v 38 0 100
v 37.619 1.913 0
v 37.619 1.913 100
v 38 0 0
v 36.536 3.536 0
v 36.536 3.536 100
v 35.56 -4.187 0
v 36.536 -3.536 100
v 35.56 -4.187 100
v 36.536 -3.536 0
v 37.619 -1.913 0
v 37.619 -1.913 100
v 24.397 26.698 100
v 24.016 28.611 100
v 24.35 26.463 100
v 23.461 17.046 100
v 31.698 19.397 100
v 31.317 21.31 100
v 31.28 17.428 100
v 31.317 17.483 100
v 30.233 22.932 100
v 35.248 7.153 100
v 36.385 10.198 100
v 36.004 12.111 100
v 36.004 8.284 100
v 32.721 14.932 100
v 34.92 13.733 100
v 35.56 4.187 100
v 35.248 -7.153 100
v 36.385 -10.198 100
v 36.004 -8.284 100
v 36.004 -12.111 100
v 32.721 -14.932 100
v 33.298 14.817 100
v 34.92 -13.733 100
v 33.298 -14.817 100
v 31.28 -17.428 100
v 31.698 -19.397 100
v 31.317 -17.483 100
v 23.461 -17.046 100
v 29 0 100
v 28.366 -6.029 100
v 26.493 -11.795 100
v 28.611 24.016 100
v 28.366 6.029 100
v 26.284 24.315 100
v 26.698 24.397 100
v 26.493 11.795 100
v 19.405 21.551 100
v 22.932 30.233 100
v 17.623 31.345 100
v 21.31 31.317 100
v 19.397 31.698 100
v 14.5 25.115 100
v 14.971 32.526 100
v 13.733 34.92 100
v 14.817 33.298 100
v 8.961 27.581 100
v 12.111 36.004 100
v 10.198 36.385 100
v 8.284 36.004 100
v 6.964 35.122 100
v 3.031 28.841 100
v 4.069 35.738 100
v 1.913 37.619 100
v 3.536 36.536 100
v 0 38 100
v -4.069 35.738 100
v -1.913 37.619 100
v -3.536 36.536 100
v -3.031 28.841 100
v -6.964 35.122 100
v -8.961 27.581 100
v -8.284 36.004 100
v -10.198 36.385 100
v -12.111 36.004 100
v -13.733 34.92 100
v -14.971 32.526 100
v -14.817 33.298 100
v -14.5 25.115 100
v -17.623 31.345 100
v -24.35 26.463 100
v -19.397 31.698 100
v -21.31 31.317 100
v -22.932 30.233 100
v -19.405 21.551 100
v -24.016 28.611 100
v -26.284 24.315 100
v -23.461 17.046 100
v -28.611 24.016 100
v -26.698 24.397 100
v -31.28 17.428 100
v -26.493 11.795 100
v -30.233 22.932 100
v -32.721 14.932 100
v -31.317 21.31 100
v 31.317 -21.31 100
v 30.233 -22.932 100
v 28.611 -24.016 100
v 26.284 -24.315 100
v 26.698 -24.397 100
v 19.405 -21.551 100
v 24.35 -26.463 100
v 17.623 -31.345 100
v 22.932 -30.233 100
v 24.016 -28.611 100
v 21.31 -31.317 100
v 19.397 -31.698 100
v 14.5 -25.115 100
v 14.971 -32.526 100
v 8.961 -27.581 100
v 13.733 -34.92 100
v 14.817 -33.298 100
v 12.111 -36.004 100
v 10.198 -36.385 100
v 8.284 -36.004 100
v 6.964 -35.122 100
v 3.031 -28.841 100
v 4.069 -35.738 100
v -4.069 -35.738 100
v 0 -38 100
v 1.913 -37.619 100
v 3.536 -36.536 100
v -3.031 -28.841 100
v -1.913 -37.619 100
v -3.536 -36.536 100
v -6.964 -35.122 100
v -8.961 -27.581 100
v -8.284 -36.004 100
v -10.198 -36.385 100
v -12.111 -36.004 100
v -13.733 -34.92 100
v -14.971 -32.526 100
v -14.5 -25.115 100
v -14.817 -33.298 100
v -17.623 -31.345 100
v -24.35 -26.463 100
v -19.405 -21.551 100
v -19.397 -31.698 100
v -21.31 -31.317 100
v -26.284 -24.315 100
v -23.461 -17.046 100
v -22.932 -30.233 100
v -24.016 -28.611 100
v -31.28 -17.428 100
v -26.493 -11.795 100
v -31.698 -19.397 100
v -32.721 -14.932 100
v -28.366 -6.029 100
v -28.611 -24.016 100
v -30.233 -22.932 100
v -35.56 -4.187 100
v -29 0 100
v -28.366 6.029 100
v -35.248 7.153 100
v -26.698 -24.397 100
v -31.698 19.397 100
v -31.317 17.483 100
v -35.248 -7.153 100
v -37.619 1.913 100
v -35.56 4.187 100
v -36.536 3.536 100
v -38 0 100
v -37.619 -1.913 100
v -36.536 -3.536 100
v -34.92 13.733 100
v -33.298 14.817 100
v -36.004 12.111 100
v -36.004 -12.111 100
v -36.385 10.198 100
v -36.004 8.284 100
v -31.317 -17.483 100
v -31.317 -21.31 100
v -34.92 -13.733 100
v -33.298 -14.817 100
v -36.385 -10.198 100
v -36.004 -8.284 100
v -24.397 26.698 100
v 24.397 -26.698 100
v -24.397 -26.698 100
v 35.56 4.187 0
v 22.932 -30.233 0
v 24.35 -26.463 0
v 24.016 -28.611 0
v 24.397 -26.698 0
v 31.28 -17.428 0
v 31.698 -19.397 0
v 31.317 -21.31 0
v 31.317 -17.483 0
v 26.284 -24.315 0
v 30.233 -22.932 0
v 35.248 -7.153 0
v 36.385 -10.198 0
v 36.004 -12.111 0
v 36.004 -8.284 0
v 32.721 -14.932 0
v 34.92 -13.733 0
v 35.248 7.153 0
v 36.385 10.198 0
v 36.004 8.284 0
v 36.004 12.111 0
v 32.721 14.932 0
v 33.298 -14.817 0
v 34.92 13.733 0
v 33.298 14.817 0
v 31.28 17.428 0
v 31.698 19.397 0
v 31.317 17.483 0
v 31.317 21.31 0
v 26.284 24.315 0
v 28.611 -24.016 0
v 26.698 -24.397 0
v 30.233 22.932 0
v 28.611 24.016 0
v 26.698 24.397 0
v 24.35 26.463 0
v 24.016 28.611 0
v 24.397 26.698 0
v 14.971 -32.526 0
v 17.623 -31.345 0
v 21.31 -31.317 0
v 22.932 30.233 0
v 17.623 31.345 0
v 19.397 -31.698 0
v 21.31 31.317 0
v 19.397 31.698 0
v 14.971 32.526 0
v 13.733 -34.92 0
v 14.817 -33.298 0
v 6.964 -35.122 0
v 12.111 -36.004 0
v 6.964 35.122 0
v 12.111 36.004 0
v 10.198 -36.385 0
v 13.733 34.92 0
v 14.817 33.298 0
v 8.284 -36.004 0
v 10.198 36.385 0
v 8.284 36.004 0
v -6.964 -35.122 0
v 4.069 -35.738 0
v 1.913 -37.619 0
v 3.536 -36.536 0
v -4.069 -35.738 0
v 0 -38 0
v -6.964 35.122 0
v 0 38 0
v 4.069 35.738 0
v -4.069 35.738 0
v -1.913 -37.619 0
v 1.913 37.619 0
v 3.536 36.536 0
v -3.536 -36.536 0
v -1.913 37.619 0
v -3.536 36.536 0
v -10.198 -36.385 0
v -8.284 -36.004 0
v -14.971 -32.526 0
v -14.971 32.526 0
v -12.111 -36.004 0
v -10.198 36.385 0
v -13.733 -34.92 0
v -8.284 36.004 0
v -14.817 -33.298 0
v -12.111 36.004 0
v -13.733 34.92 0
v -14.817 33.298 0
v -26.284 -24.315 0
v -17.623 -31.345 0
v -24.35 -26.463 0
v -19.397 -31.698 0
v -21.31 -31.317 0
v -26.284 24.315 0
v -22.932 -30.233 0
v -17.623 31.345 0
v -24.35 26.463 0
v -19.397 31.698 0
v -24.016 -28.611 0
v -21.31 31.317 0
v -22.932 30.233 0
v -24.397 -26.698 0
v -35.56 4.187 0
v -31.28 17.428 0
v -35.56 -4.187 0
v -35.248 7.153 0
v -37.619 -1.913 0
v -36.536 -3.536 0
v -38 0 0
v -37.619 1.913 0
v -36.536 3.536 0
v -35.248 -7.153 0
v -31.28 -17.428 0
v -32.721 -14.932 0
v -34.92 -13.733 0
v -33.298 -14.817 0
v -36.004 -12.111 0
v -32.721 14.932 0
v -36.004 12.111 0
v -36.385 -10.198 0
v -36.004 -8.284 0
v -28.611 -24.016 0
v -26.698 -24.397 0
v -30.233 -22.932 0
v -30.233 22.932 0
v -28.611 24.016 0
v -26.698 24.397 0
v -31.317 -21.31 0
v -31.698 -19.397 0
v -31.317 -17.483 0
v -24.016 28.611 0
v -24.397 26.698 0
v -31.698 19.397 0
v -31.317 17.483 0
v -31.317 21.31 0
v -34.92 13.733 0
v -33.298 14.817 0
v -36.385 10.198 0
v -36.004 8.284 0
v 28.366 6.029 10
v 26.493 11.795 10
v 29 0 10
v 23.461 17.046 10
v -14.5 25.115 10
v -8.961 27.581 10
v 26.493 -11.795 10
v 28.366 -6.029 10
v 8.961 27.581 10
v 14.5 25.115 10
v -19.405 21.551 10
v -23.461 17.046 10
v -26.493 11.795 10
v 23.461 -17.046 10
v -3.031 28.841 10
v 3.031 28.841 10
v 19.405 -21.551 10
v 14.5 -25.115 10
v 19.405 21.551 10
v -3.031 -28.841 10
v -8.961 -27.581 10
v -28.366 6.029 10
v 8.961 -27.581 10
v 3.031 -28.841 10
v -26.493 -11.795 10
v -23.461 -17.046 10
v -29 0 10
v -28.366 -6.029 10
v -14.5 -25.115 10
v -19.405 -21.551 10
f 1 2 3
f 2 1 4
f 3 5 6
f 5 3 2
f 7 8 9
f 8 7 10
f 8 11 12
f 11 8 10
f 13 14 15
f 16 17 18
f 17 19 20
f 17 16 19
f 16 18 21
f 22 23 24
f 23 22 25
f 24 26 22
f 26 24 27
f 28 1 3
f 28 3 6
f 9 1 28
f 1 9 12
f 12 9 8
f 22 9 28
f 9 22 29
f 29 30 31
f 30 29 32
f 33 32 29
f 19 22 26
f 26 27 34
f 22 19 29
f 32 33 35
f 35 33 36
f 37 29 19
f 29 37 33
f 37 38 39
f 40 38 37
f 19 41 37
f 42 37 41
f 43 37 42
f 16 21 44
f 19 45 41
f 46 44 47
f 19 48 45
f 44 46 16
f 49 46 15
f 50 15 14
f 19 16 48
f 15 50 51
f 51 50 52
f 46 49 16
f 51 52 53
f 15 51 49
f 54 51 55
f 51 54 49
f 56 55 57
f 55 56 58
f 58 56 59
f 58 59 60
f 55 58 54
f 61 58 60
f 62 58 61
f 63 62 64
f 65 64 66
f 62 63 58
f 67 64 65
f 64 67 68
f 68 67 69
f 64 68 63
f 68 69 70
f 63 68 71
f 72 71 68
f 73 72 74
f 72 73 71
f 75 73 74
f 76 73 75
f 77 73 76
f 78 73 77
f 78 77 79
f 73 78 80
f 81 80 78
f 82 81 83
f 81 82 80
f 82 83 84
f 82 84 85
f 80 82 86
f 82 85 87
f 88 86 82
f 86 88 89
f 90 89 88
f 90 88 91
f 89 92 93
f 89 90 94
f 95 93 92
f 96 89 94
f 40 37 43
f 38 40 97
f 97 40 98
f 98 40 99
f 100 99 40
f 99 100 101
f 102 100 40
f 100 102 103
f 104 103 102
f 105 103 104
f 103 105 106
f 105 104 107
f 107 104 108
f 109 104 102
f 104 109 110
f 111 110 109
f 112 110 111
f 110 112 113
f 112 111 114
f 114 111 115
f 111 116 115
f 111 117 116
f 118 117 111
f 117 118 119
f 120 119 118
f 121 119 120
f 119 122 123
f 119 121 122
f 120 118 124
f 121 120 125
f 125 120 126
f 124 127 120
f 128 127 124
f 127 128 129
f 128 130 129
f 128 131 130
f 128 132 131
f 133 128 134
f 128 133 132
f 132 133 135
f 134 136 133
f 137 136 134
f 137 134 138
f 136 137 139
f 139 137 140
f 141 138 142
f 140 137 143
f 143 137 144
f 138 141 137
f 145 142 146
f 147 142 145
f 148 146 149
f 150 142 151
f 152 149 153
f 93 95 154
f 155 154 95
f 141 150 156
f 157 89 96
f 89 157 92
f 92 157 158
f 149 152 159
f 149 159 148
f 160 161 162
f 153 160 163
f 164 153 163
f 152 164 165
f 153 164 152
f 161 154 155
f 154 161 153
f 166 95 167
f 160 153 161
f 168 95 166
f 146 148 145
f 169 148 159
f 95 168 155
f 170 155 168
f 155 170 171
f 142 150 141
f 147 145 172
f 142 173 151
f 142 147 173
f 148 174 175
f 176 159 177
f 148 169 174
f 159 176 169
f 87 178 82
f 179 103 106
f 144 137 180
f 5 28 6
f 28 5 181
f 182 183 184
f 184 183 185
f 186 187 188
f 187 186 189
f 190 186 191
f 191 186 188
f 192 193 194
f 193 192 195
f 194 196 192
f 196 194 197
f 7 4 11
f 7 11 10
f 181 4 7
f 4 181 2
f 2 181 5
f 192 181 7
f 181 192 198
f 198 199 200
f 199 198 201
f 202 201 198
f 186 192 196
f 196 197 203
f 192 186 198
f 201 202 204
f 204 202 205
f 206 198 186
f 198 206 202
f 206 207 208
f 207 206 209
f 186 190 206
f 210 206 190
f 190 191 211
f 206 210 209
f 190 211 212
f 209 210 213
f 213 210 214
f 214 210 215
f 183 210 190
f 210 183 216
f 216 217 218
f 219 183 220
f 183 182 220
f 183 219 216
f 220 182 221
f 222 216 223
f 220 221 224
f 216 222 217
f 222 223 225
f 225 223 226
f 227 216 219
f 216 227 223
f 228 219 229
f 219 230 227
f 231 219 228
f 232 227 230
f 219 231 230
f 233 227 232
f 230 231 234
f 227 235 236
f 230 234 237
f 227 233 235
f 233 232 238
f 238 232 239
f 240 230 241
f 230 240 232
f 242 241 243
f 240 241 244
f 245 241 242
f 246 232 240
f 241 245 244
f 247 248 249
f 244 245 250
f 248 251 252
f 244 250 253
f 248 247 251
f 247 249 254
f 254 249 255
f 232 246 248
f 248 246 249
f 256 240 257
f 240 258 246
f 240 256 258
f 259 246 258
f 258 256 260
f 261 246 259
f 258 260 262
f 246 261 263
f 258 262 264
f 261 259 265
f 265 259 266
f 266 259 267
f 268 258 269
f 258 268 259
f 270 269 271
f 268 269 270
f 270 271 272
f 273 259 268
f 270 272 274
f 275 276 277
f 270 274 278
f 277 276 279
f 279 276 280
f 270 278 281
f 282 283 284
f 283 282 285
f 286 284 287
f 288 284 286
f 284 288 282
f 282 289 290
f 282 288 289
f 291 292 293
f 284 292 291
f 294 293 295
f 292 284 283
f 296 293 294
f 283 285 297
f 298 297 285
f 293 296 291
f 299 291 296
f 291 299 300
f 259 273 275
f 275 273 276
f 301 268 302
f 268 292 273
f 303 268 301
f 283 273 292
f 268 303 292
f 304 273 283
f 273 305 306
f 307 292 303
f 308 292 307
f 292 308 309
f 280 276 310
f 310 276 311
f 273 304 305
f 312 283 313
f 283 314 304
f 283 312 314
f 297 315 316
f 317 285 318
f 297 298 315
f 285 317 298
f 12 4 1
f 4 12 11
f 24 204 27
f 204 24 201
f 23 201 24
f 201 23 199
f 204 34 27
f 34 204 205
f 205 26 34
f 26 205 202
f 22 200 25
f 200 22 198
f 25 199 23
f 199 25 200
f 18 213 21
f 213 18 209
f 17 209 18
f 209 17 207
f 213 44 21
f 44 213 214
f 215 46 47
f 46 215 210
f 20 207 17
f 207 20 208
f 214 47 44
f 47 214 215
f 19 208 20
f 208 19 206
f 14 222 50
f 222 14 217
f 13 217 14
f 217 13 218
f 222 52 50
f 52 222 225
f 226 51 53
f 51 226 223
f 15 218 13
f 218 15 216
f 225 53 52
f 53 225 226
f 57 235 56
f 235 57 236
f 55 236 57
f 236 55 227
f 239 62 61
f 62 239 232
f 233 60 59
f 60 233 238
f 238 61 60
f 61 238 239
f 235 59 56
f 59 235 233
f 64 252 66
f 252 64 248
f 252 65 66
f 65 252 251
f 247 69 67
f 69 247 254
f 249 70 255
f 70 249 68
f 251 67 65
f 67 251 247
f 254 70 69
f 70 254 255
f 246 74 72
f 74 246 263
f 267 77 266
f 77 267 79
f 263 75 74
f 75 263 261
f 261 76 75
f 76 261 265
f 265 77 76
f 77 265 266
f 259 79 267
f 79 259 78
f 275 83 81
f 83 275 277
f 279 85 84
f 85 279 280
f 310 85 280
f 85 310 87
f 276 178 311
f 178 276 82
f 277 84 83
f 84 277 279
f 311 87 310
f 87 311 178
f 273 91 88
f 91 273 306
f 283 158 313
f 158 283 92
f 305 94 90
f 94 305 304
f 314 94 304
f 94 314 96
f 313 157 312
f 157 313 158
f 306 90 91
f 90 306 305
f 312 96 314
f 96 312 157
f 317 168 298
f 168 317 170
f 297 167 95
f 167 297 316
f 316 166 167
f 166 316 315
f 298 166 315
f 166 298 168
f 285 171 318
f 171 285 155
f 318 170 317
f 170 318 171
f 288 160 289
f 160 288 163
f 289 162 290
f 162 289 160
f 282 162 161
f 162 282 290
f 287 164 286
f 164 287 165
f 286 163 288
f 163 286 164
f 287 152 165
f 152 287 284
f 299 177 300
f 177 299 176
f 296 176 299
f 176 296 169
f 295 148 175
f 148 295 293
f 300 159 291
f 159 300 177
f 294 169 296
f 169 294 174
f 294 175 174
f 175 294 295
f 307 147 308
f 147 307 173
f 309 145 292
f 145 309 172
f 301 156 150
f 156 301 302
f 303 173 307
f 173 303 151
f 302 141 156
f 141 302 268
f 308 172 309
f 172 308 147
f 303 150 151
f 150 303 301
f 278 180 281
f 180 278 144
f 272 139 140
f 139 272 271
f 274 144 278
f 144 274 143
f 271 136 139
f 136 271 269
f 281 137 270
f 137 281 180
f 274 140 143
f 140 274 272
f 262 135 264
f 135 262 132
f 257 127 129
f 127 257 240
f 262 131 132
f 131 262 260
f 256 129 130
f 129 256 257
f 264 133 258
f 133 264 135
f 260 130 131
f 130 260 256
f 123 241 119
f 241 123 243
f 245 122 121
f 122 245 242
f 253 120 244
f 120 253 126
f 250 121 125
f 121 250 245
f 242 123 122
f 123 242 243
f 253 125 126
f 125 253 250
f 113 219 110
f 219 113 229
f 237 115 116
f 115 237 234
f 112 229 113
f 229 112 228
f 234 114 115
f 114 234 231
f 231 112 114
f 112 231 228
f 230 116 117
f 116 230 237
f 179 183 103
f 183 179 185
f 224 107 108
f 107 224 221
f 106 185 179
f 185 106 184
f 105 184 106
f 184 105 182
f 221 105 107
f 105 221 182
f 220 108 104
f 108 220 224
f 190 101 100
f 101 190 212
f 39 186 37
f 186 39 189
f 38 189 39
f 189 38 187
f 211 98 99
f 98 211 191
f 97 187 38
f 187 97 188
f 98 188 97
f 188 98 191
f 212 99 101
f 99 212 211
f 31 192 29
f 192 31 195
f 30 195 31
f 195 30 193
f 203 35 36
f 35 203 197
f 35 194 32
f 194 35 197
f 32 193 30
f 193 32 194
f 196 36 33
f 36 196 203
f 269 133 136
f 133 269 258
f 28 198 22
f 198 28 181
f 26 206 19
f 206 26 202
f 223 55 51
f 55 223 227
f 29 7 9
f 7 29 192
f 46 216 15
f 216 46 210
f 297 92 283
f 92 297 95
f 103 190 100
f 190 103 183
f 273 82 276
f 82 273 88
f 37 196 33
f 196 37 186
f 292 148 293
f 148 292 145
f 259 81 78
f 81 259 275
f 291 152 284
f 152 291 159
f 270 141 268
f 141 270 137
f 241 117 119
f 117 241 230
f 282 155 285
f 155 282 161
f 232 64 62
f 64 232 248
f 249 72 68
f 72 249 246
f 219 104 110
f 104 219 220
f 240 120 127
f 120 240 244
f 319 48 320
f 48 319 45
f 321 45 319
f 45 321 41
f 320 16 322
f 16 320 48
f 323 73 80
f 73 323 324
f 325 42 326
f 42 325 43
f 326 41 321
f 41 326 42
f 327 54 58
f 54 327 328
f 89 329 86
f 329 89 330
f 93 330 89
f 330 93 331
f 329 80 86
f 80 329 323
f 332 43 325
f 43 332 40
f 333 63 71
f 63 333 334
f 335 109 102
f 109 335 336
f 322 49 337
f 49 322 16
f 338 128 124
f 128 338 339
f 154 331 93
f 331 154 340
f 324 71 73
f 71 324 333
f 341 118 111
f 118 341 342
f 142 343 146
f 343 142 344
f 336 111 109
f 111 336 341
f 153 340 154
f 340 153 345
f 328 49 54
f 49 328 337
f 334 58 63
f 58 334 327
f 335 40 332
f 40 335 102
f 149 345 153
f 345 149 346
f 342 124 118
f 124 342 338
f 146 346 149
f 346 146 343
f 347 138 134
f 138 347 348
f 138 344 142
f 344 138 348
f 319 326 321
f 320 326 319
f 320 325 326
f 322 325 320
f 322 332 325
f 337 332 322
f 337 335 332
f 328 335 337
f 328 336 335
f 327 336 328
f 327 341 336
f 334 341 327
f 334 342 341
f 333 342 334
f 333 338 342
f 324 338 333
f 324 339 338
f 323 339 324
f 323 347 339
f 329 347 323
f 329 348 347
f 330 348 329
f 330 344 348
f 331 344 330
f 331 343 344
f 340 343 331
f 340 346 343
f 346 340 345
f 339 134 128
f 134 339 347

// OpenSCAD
DIE = 16;
RADIUS = 16*4.5/2;
echo(RADIUS);

WIDTH = 7;
HEIGHT_OFFSET = 10;
HEIGHT = 100;
echo(RADIUS-WIDTH);
difference() {
  union() {
    cylinder(h=HEIGHT, r=RADIUS);
    for (i = [0 : 18 : 359]) {
      echo(i);
      translate([cos(i)*(RADIUS-3), sin(i)*(RADIUS-3), 0]) {
          cylinder(h=100, r=5);
      }
    }
  }
  translate([0, 0, HEIGHT_OFFSET]) {
    cylinder(h=HEIGHT-HEIGHT_OFFSET, r=RADIUS-WIDTH);
  }
}
